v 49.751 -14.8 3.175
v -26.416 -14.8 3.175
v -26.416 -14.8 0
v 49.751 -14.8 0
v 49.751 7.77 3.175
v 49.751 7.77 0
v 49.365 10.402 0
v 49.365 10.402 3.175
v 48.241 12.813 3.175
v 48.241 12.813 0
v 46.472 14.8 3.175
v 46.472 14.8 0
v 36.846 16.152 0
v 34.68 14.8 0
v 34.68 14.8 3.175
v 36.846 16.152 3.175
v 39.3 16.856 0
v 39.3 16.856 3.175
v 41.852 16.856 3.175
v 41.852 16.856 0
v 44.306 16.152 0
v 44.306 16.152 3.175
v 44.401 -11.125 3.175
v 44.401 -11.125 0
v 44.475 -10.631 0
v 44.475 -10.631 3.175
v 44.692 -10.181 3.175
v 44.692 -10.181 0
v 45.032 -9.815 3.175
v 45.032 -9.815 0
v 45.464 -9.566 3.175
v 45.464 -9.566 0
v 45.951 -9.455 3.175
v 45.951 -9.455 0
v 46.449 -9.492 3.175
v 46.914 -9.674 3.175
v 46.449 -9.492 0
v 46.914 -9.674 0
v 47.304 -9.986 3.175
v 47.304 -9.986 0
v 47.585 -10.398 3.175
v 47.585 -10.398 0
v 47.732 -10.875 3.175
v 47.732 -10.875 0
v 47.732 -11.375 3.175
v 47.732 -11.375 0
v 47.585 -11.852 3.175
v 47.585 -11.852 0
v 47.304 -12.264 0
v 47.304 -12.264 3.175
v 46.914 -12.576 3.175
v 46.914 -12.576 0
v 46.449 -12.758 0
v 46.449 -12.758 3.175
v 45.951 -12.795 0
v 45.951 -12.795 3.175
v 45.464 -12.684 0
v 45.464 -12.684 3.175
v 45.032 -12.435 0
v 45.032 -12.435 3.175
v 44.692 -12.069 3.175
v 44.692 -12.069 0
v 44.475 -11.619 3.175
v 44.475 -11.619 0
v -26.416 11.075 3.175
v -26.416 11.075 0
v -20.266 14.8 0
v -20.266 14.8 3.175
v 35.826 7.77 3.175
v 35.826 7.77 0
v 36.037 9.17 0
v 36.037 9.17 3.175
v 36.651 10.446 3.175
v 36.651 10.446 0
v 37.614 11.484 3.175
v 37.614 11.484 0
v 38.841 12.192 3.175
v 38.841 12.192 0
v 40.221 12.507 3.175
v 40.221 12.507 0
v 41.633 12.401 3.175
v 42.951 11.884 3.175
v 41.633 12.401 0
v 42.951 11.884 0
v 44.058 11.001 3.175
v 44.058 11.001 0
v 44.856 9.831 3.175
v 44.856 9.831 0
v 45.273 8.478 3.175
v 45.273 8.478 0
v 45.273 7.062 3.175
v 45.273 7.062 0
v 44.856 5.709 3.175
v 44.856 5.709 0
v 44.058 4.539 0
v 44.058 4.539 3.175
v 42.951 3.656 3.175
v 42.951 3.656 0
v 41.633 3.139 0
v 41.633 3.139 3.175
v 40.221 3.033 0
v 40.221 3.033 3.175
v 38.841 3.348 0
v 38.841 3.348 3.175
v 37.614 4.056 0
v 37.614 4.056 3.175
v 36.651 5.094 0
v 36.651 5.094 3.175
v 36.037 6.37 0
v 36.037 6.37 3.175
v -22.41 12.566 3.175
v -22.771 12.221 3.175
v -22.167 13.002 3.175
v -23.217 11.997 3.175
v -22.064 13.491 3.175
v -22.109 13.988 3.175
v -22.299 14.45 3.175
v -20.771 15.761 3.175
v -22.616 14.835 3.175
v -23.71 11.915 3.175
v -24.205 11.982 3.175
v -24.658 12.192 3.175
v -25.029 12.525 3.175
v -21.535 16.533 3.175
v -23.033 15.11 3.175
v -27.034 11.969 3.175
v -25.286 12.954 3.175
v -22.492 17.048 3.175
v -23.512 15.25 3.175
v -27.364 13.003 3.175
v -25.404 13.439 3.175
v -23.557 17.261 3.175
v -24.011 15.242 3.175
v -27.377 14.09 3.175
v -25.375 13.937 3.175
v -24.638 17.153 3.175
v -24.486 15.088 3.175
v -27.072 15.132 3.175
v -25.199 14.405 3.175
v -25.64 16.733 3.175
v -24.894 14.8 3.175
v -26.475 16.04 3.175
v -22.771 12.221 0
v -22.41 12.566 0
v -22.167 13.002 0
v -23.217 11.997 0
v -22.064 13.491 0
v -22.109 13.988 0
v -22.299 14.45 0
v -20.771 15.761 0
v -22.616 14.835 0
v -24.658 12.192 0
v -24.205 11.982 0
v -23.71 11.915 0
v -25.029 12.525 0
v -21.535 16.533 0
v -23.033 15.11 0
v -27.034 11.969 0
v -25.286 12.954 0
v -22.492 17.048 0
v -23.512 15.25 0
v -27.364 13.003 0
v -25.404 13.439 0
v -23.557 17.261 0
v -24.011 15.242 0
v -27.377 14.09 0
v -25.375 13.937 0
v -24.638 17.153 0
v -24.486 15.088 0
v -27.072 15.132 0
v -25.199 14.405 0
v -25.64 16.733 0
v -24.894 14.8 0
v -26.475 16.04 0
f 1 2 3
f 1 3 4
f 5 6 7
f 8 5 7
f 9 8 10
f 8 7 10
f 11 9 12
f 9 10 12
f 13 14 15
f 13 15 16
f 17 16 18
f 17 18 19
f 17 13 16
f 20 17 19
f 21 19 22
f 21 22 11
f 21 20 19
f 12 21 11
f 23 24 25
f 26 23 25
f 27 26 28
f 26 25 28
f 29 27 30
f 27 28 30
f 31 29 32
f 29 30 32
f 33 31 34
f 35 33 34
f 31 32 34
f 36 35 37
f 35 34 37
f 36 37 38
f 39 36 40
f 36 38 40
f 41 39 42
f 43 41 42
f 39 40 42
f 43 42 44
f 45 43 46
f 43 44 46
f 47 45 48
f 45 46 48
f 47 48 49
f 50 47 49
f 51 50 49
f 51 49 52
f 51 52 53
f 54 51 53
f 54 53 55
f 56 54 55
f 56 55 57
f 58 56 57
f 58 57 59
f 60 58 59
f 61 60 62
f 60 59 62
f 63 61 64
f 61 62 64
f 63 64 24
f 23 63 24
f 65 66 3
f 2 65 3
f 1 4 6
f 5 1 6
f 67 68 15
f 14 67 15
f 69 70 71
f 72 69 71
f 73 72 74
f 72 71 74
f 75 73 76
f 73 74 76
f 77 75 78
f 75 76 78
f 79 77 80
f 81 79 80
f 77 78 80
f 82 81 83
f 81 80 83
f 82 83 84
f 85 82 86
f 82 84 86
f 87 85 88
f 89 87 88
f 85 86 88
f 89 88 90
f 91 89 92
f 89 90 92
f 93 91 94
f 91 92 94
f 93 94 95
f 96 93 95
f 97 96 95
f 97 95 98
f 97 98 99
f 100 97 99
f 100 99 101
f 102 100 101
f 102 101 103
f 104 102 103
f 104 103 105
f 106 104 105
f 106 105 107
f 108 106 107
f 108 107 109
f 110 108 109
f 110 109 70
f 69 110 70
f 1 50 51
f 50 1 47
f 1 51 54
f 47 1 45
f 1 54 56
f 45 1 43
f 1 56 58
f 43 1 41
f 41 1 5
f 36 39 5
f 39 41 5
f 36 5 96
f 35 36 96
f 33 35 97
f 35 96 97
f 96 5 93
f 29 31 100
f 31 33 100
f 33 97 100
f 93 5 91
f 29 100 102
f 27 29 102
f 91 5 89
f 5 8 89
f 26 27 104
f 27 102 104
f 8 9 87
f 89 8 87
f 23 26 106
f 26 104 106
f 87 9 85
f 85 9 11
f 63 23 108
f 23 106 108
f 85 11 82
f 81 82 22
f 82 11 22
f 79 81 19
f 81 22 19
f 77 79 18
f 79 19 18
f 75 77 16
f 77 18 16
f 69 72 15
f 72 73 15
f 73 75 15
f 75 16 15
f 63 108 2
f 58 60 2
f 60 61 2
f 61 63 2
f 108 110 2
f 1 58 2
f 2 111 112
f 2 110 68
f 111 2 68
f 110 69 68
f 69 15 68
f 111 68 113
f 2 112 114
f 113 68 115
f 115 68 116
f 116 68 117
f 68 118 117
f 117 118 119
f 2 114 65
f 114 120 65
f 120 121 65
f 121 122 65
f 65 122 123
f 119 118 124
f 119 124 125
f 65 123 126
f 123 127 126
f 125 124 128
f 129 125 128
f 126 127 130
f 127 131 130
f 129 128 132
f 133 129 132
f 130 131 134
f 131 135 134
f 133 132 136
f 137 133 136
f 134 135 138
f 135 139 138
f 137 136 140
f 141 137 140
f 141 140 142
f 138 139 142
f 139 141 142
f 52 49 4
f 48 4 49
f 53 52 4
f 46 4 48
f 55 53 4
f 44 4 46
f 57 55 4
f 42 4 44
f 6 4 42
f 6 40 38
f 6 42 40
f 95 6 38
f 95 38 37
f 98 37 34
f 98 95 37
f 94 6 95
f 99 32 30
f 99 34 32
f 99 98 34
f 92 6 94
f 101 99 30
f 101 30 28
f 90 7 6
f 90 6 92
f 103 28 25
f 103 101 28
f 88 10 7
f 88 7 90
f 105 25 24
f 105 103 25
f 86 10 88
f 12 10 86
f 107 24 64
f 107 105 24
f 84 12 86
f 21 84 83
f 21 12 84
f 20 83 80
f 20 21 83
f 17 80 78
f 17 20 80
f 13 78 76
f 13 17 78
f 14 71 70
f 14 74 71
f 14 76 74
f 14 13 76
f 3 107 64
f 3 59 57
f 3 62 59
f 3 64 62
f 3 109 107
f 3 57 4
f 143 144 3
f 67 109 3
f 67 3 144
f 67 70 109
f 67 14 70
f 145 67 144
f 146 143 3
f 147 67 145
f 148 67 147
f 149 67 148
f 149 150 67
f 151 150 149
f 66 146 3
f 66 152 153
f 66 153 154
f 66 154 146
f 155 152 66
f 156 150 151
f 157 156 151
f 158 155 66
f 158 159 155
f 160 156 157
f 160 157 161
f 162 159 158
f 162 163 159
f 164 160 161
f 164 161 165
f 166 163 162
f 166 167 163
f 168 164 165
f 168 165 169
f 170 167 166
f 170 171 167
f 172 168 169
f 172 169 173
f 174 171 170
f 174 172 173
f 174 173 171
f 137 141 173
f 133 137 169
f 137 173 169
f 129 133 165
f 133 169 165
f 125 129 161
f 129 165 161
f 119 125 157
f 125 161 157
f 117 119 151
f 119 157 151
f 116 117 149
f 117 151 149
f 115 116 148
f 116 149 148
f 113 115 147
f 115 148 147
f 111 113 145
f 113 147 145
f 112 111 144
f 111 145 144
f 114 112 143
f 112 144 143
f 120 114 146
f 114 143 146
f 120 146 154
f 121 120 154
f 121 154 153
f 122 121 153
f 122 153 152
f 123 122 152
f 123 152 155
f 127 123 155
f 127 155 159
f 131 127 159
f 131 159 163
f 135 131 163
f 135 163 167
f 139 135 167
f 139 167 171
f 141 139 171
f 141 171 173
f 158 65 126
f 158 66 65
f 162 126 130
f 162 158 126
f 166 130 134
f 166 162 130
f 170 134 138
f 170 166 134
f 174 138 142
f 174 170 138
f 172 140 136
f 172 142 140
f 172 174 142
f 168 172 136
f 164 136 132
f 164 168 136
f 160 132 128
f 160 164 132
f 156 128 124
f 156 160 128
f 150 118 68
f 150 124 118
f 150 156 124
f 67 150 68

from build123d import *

# Parameters (mm, degrees)
SKETCH1_W            = 6.266
SKETCH1_H            = 19.6
SKETCH1_R            = 1.675
SKETCH1_W_2          = 52.832
SKETCH1_H_2          = 5
BOSS_EXTRUDE2_DEPTH  = 3.175
SKETCH3_W            = 30
SKETCH3_H            = 29.6
BOSS_EXTRUDE3_DEPTH  = 3.175
SKETCH4_R            = 4.75
CUT_EXTRUDE1_DEPTH   = 10
BOSS_EXTRUDE14_DEPTH = 3.175
CUT_EXTRUDE8_DEPTH   = 10
SKETCH24_R           = 1.675
CUT_EXTRUDE9_DEPTH   = 10
SKETCH25_R           = 3.675
SKETCH25_R_2         = 1.675
BOSS_EXTRUDE15_DEPTH = 3.175
SKETCH26_R           = 1.675
CUT_EXTRUDE12_DEPTH  = 3.175
SKETCH27_W           = 52.932563224
SKETCH27_H           = 23.005559857
BOSS_EXTRUDE16_DEPTH = 3.175
CUT_EXTRUDE14_DEPTH  = 10


with BuildPart() as part:
    # Sketch1 → Boss-Extrude2 (new body)
    # profile 1 of 4: a face of its own
    with BuildSketch(Plane.XY):
        with Locations((-23.283, 0)):
            Rectangle(SKETCH1_W, SKETCH1_H)
        with Locations((-23.95, -4.974)):
            Circle(SKETCH1_R, mode=Mode.SUBTRACT)
        with Locations((-23.95, 4.974)):
            Circle(SKETCH1_R, mode=Mode.SUBTRACT)
    # profile 2 of 4: a face of its own
    with BuildSketch(Plane.XY):
        with Locations((0, -12.3)):
            Rectangle(SKETCH1_W_2, SKETCH1_H_2)
    # profile 3 of 4: a face of its own
    with BuildSketch(Plane.XY):
        with Locations((0, 12.3)):
            Rectangle(SKETCH1_W_2, SKETCH1_H_2)
    # profile 4 of 4: a face of its own
    with BuildSketch(Plane.XY):
        with Locations((23.283, 0)):
            Rectangle(SKETCH1_W, SKETCH1_H)
        with Locations((23.95, -4.974)):
            Circle(SKETCH1_R, mode=Mode.SUBTRACT)
        with Locations((23.95, 4.974)):
            Circle(SKETCH1_R, mode=Mode.SUBTRACT)
    extrude(amount=BOSS_EXTRUDE2_DEPTH)

    # Sketch3 → Boss-Extrude3 (add)
    with BuildSketch(Plane.XY.offset(3.175)):
        with Locations((41.416, 0)):
            Rectangle(SKETCH3_W, SKETCH3_H)
    extrude(amount=-BOSS_EXTRUDE3_DEPTH)

    # Sketch4 → Cut-Extrude1 (cut)
    with BuildSketch(Plane(origin=(0, 0, 0), x_dir=(-1, 0, 0), z_dir=(0, 0, -1))):
        with Locations((-40.576, 7.77)):
            Circle(SKETCH4_R)
    extrude(amount=-CUT_EXTRUDE1_DEPTH, mode=Mode.SUBTRACT)

    # Sketch22 → Boss-Extrude14 (add)
    with BuildSketch(Plane(origin=(0, 0, 0), x_dir=(-1, 0, 0), z_dir=(0, 0, -1))):
        with BuildLine():
            ThreePointArc((-34.680262133, 14.8), (-40.576, 16.945), (-46.471737867, 14.8))
            Line((-46.471737867, 14.8), (-34.680262133, 14.8))
        make_face()
    extrude(amount=-BOSS_EXTRUDE14_DEPTH)

    # Sketch23 → Cut-Extrude8 (cut)
    with BuildSketch(Plane(origin=(0, 0, 0), x_dir=(-1, 0, 0), z_dir=(0, 0, -1))):
        with BuildLine():
            Line((-49.751, -14.8), (-49.751, 7.77))
            ThreePointArc((-49.751, 7.77), (-48.890866804, 11.648609936), (-46.471737867, 14.8))
            Line((-46.471737867, 14.8), (-56.416, 14.8))
            Line((-56.416, 14.8), (-56.416, -14.8))
            Line((-56.416, -14.8), (-49.751, -14.8))
        make_face()
    extrude(amount=-CUT_EXTRUDE8_DEPTH, mode=Mode.SUBTRACT)

    # Sketch24 → Cut-Extrude9 (cut)
    with BuildSketch(Plane(origin=(0, 0, 0), x_dir=(-1, 0, 0), z_dir=(0, 0, -1))):
        with Locations((23.736, 13.59)):
            Circle(SKETCH24_R)
    extrude(amount=-CUT_EXTRUDE9_DEPTH, mode=Mode.SUBTRACT)

    # Sketch25 → Boss-Extrude15 (add)
    # profile 1 of 3: a face of its own
    with BuildSketch(Plane(origin=(0, 0, 0), x_dir=(-1, 0, 0), z_dir=(0, 0, -1))):
        with Locations((23.95, -4.974)):
            Circle(SKETCH25_R)
        with Locations(Location((23.95, -4.974, 0), (0, 0, 180))):
            Circle(SKETCH25_R_2, mode=Mode.SUBTRACT)
    # profile 2 of 3: a face of its own
    with BuildSketch(Plane(origin=(0, 0, 0), x_dir=(-1, 0, 0), z_dir=(0, 0, -1))):
        with Locations((23.95, 4.974)):
            Circle(SKETCH25_R)
        with Locations(Location((23.95, 4.974, 0), (0, 0, 180))):
            Circle(SKETCH25_R_2, mode=Mode.SUBTRACT)
    # profile 3 of 3: a face of its own
    with BuildSketch(Plane(origin=(0, 0, 0), x_dir=(-1, 0, 0), z_dir=(0, 0, -1))):
        with Locations((23.736, 13.59)):
            Circle(SKETCH25_R)
        with Locations((23.736, 13.59)):
            Circle(SKETCH25_R_2, mode=Mode.SUBTRACT)
    extrude(amount=-BOSS_EXTRUDE15_DEPTH)

    # Sketch26 → Cut-Extrude12 (cut)
    with BuildSketch(Plane(origin=(0, 0, 0), x_dir=(-1, 0, 0), z_dir=(0, 0, -1))):
        with Locations((-46.076, -11.125)):
            Circle(SKETCH26_R)
    extrude(amount=-CUT_EXTRUDE12_DEPTH, mode=Mode.SUBTRACT)

    # Sketch27 → Boss-Extrude16 (add)
    with BuildSketch(Plane(origin=(0, 0, 0), x_dir=(-1, 0, 0), z_dir=(0, 0, -1))):
        with Locations((-0.417160697, -0.481381251)):
            Rectangle(SKETCH27_W, SKETCH27_H)
    extrude(amount=-BOSS_EXTRUDE16_DEPTH)

    # Sketch28 → Cut-Extrude14 (cut)
    with BuildSketch(Plane(origin=(0, 0, 0), x_dir=(-1, 0, 0), z_dir=(0, 0, -1))):
        Polygon((26.416, 8.97792488), (26.416, -8.885991227), (33.695668031, -3.414754928), align=None)
    extrude(amount=-CUT_EXTRUDE14_DEPTH, mode=Mode.SUBTRACT)


solid = part.part
